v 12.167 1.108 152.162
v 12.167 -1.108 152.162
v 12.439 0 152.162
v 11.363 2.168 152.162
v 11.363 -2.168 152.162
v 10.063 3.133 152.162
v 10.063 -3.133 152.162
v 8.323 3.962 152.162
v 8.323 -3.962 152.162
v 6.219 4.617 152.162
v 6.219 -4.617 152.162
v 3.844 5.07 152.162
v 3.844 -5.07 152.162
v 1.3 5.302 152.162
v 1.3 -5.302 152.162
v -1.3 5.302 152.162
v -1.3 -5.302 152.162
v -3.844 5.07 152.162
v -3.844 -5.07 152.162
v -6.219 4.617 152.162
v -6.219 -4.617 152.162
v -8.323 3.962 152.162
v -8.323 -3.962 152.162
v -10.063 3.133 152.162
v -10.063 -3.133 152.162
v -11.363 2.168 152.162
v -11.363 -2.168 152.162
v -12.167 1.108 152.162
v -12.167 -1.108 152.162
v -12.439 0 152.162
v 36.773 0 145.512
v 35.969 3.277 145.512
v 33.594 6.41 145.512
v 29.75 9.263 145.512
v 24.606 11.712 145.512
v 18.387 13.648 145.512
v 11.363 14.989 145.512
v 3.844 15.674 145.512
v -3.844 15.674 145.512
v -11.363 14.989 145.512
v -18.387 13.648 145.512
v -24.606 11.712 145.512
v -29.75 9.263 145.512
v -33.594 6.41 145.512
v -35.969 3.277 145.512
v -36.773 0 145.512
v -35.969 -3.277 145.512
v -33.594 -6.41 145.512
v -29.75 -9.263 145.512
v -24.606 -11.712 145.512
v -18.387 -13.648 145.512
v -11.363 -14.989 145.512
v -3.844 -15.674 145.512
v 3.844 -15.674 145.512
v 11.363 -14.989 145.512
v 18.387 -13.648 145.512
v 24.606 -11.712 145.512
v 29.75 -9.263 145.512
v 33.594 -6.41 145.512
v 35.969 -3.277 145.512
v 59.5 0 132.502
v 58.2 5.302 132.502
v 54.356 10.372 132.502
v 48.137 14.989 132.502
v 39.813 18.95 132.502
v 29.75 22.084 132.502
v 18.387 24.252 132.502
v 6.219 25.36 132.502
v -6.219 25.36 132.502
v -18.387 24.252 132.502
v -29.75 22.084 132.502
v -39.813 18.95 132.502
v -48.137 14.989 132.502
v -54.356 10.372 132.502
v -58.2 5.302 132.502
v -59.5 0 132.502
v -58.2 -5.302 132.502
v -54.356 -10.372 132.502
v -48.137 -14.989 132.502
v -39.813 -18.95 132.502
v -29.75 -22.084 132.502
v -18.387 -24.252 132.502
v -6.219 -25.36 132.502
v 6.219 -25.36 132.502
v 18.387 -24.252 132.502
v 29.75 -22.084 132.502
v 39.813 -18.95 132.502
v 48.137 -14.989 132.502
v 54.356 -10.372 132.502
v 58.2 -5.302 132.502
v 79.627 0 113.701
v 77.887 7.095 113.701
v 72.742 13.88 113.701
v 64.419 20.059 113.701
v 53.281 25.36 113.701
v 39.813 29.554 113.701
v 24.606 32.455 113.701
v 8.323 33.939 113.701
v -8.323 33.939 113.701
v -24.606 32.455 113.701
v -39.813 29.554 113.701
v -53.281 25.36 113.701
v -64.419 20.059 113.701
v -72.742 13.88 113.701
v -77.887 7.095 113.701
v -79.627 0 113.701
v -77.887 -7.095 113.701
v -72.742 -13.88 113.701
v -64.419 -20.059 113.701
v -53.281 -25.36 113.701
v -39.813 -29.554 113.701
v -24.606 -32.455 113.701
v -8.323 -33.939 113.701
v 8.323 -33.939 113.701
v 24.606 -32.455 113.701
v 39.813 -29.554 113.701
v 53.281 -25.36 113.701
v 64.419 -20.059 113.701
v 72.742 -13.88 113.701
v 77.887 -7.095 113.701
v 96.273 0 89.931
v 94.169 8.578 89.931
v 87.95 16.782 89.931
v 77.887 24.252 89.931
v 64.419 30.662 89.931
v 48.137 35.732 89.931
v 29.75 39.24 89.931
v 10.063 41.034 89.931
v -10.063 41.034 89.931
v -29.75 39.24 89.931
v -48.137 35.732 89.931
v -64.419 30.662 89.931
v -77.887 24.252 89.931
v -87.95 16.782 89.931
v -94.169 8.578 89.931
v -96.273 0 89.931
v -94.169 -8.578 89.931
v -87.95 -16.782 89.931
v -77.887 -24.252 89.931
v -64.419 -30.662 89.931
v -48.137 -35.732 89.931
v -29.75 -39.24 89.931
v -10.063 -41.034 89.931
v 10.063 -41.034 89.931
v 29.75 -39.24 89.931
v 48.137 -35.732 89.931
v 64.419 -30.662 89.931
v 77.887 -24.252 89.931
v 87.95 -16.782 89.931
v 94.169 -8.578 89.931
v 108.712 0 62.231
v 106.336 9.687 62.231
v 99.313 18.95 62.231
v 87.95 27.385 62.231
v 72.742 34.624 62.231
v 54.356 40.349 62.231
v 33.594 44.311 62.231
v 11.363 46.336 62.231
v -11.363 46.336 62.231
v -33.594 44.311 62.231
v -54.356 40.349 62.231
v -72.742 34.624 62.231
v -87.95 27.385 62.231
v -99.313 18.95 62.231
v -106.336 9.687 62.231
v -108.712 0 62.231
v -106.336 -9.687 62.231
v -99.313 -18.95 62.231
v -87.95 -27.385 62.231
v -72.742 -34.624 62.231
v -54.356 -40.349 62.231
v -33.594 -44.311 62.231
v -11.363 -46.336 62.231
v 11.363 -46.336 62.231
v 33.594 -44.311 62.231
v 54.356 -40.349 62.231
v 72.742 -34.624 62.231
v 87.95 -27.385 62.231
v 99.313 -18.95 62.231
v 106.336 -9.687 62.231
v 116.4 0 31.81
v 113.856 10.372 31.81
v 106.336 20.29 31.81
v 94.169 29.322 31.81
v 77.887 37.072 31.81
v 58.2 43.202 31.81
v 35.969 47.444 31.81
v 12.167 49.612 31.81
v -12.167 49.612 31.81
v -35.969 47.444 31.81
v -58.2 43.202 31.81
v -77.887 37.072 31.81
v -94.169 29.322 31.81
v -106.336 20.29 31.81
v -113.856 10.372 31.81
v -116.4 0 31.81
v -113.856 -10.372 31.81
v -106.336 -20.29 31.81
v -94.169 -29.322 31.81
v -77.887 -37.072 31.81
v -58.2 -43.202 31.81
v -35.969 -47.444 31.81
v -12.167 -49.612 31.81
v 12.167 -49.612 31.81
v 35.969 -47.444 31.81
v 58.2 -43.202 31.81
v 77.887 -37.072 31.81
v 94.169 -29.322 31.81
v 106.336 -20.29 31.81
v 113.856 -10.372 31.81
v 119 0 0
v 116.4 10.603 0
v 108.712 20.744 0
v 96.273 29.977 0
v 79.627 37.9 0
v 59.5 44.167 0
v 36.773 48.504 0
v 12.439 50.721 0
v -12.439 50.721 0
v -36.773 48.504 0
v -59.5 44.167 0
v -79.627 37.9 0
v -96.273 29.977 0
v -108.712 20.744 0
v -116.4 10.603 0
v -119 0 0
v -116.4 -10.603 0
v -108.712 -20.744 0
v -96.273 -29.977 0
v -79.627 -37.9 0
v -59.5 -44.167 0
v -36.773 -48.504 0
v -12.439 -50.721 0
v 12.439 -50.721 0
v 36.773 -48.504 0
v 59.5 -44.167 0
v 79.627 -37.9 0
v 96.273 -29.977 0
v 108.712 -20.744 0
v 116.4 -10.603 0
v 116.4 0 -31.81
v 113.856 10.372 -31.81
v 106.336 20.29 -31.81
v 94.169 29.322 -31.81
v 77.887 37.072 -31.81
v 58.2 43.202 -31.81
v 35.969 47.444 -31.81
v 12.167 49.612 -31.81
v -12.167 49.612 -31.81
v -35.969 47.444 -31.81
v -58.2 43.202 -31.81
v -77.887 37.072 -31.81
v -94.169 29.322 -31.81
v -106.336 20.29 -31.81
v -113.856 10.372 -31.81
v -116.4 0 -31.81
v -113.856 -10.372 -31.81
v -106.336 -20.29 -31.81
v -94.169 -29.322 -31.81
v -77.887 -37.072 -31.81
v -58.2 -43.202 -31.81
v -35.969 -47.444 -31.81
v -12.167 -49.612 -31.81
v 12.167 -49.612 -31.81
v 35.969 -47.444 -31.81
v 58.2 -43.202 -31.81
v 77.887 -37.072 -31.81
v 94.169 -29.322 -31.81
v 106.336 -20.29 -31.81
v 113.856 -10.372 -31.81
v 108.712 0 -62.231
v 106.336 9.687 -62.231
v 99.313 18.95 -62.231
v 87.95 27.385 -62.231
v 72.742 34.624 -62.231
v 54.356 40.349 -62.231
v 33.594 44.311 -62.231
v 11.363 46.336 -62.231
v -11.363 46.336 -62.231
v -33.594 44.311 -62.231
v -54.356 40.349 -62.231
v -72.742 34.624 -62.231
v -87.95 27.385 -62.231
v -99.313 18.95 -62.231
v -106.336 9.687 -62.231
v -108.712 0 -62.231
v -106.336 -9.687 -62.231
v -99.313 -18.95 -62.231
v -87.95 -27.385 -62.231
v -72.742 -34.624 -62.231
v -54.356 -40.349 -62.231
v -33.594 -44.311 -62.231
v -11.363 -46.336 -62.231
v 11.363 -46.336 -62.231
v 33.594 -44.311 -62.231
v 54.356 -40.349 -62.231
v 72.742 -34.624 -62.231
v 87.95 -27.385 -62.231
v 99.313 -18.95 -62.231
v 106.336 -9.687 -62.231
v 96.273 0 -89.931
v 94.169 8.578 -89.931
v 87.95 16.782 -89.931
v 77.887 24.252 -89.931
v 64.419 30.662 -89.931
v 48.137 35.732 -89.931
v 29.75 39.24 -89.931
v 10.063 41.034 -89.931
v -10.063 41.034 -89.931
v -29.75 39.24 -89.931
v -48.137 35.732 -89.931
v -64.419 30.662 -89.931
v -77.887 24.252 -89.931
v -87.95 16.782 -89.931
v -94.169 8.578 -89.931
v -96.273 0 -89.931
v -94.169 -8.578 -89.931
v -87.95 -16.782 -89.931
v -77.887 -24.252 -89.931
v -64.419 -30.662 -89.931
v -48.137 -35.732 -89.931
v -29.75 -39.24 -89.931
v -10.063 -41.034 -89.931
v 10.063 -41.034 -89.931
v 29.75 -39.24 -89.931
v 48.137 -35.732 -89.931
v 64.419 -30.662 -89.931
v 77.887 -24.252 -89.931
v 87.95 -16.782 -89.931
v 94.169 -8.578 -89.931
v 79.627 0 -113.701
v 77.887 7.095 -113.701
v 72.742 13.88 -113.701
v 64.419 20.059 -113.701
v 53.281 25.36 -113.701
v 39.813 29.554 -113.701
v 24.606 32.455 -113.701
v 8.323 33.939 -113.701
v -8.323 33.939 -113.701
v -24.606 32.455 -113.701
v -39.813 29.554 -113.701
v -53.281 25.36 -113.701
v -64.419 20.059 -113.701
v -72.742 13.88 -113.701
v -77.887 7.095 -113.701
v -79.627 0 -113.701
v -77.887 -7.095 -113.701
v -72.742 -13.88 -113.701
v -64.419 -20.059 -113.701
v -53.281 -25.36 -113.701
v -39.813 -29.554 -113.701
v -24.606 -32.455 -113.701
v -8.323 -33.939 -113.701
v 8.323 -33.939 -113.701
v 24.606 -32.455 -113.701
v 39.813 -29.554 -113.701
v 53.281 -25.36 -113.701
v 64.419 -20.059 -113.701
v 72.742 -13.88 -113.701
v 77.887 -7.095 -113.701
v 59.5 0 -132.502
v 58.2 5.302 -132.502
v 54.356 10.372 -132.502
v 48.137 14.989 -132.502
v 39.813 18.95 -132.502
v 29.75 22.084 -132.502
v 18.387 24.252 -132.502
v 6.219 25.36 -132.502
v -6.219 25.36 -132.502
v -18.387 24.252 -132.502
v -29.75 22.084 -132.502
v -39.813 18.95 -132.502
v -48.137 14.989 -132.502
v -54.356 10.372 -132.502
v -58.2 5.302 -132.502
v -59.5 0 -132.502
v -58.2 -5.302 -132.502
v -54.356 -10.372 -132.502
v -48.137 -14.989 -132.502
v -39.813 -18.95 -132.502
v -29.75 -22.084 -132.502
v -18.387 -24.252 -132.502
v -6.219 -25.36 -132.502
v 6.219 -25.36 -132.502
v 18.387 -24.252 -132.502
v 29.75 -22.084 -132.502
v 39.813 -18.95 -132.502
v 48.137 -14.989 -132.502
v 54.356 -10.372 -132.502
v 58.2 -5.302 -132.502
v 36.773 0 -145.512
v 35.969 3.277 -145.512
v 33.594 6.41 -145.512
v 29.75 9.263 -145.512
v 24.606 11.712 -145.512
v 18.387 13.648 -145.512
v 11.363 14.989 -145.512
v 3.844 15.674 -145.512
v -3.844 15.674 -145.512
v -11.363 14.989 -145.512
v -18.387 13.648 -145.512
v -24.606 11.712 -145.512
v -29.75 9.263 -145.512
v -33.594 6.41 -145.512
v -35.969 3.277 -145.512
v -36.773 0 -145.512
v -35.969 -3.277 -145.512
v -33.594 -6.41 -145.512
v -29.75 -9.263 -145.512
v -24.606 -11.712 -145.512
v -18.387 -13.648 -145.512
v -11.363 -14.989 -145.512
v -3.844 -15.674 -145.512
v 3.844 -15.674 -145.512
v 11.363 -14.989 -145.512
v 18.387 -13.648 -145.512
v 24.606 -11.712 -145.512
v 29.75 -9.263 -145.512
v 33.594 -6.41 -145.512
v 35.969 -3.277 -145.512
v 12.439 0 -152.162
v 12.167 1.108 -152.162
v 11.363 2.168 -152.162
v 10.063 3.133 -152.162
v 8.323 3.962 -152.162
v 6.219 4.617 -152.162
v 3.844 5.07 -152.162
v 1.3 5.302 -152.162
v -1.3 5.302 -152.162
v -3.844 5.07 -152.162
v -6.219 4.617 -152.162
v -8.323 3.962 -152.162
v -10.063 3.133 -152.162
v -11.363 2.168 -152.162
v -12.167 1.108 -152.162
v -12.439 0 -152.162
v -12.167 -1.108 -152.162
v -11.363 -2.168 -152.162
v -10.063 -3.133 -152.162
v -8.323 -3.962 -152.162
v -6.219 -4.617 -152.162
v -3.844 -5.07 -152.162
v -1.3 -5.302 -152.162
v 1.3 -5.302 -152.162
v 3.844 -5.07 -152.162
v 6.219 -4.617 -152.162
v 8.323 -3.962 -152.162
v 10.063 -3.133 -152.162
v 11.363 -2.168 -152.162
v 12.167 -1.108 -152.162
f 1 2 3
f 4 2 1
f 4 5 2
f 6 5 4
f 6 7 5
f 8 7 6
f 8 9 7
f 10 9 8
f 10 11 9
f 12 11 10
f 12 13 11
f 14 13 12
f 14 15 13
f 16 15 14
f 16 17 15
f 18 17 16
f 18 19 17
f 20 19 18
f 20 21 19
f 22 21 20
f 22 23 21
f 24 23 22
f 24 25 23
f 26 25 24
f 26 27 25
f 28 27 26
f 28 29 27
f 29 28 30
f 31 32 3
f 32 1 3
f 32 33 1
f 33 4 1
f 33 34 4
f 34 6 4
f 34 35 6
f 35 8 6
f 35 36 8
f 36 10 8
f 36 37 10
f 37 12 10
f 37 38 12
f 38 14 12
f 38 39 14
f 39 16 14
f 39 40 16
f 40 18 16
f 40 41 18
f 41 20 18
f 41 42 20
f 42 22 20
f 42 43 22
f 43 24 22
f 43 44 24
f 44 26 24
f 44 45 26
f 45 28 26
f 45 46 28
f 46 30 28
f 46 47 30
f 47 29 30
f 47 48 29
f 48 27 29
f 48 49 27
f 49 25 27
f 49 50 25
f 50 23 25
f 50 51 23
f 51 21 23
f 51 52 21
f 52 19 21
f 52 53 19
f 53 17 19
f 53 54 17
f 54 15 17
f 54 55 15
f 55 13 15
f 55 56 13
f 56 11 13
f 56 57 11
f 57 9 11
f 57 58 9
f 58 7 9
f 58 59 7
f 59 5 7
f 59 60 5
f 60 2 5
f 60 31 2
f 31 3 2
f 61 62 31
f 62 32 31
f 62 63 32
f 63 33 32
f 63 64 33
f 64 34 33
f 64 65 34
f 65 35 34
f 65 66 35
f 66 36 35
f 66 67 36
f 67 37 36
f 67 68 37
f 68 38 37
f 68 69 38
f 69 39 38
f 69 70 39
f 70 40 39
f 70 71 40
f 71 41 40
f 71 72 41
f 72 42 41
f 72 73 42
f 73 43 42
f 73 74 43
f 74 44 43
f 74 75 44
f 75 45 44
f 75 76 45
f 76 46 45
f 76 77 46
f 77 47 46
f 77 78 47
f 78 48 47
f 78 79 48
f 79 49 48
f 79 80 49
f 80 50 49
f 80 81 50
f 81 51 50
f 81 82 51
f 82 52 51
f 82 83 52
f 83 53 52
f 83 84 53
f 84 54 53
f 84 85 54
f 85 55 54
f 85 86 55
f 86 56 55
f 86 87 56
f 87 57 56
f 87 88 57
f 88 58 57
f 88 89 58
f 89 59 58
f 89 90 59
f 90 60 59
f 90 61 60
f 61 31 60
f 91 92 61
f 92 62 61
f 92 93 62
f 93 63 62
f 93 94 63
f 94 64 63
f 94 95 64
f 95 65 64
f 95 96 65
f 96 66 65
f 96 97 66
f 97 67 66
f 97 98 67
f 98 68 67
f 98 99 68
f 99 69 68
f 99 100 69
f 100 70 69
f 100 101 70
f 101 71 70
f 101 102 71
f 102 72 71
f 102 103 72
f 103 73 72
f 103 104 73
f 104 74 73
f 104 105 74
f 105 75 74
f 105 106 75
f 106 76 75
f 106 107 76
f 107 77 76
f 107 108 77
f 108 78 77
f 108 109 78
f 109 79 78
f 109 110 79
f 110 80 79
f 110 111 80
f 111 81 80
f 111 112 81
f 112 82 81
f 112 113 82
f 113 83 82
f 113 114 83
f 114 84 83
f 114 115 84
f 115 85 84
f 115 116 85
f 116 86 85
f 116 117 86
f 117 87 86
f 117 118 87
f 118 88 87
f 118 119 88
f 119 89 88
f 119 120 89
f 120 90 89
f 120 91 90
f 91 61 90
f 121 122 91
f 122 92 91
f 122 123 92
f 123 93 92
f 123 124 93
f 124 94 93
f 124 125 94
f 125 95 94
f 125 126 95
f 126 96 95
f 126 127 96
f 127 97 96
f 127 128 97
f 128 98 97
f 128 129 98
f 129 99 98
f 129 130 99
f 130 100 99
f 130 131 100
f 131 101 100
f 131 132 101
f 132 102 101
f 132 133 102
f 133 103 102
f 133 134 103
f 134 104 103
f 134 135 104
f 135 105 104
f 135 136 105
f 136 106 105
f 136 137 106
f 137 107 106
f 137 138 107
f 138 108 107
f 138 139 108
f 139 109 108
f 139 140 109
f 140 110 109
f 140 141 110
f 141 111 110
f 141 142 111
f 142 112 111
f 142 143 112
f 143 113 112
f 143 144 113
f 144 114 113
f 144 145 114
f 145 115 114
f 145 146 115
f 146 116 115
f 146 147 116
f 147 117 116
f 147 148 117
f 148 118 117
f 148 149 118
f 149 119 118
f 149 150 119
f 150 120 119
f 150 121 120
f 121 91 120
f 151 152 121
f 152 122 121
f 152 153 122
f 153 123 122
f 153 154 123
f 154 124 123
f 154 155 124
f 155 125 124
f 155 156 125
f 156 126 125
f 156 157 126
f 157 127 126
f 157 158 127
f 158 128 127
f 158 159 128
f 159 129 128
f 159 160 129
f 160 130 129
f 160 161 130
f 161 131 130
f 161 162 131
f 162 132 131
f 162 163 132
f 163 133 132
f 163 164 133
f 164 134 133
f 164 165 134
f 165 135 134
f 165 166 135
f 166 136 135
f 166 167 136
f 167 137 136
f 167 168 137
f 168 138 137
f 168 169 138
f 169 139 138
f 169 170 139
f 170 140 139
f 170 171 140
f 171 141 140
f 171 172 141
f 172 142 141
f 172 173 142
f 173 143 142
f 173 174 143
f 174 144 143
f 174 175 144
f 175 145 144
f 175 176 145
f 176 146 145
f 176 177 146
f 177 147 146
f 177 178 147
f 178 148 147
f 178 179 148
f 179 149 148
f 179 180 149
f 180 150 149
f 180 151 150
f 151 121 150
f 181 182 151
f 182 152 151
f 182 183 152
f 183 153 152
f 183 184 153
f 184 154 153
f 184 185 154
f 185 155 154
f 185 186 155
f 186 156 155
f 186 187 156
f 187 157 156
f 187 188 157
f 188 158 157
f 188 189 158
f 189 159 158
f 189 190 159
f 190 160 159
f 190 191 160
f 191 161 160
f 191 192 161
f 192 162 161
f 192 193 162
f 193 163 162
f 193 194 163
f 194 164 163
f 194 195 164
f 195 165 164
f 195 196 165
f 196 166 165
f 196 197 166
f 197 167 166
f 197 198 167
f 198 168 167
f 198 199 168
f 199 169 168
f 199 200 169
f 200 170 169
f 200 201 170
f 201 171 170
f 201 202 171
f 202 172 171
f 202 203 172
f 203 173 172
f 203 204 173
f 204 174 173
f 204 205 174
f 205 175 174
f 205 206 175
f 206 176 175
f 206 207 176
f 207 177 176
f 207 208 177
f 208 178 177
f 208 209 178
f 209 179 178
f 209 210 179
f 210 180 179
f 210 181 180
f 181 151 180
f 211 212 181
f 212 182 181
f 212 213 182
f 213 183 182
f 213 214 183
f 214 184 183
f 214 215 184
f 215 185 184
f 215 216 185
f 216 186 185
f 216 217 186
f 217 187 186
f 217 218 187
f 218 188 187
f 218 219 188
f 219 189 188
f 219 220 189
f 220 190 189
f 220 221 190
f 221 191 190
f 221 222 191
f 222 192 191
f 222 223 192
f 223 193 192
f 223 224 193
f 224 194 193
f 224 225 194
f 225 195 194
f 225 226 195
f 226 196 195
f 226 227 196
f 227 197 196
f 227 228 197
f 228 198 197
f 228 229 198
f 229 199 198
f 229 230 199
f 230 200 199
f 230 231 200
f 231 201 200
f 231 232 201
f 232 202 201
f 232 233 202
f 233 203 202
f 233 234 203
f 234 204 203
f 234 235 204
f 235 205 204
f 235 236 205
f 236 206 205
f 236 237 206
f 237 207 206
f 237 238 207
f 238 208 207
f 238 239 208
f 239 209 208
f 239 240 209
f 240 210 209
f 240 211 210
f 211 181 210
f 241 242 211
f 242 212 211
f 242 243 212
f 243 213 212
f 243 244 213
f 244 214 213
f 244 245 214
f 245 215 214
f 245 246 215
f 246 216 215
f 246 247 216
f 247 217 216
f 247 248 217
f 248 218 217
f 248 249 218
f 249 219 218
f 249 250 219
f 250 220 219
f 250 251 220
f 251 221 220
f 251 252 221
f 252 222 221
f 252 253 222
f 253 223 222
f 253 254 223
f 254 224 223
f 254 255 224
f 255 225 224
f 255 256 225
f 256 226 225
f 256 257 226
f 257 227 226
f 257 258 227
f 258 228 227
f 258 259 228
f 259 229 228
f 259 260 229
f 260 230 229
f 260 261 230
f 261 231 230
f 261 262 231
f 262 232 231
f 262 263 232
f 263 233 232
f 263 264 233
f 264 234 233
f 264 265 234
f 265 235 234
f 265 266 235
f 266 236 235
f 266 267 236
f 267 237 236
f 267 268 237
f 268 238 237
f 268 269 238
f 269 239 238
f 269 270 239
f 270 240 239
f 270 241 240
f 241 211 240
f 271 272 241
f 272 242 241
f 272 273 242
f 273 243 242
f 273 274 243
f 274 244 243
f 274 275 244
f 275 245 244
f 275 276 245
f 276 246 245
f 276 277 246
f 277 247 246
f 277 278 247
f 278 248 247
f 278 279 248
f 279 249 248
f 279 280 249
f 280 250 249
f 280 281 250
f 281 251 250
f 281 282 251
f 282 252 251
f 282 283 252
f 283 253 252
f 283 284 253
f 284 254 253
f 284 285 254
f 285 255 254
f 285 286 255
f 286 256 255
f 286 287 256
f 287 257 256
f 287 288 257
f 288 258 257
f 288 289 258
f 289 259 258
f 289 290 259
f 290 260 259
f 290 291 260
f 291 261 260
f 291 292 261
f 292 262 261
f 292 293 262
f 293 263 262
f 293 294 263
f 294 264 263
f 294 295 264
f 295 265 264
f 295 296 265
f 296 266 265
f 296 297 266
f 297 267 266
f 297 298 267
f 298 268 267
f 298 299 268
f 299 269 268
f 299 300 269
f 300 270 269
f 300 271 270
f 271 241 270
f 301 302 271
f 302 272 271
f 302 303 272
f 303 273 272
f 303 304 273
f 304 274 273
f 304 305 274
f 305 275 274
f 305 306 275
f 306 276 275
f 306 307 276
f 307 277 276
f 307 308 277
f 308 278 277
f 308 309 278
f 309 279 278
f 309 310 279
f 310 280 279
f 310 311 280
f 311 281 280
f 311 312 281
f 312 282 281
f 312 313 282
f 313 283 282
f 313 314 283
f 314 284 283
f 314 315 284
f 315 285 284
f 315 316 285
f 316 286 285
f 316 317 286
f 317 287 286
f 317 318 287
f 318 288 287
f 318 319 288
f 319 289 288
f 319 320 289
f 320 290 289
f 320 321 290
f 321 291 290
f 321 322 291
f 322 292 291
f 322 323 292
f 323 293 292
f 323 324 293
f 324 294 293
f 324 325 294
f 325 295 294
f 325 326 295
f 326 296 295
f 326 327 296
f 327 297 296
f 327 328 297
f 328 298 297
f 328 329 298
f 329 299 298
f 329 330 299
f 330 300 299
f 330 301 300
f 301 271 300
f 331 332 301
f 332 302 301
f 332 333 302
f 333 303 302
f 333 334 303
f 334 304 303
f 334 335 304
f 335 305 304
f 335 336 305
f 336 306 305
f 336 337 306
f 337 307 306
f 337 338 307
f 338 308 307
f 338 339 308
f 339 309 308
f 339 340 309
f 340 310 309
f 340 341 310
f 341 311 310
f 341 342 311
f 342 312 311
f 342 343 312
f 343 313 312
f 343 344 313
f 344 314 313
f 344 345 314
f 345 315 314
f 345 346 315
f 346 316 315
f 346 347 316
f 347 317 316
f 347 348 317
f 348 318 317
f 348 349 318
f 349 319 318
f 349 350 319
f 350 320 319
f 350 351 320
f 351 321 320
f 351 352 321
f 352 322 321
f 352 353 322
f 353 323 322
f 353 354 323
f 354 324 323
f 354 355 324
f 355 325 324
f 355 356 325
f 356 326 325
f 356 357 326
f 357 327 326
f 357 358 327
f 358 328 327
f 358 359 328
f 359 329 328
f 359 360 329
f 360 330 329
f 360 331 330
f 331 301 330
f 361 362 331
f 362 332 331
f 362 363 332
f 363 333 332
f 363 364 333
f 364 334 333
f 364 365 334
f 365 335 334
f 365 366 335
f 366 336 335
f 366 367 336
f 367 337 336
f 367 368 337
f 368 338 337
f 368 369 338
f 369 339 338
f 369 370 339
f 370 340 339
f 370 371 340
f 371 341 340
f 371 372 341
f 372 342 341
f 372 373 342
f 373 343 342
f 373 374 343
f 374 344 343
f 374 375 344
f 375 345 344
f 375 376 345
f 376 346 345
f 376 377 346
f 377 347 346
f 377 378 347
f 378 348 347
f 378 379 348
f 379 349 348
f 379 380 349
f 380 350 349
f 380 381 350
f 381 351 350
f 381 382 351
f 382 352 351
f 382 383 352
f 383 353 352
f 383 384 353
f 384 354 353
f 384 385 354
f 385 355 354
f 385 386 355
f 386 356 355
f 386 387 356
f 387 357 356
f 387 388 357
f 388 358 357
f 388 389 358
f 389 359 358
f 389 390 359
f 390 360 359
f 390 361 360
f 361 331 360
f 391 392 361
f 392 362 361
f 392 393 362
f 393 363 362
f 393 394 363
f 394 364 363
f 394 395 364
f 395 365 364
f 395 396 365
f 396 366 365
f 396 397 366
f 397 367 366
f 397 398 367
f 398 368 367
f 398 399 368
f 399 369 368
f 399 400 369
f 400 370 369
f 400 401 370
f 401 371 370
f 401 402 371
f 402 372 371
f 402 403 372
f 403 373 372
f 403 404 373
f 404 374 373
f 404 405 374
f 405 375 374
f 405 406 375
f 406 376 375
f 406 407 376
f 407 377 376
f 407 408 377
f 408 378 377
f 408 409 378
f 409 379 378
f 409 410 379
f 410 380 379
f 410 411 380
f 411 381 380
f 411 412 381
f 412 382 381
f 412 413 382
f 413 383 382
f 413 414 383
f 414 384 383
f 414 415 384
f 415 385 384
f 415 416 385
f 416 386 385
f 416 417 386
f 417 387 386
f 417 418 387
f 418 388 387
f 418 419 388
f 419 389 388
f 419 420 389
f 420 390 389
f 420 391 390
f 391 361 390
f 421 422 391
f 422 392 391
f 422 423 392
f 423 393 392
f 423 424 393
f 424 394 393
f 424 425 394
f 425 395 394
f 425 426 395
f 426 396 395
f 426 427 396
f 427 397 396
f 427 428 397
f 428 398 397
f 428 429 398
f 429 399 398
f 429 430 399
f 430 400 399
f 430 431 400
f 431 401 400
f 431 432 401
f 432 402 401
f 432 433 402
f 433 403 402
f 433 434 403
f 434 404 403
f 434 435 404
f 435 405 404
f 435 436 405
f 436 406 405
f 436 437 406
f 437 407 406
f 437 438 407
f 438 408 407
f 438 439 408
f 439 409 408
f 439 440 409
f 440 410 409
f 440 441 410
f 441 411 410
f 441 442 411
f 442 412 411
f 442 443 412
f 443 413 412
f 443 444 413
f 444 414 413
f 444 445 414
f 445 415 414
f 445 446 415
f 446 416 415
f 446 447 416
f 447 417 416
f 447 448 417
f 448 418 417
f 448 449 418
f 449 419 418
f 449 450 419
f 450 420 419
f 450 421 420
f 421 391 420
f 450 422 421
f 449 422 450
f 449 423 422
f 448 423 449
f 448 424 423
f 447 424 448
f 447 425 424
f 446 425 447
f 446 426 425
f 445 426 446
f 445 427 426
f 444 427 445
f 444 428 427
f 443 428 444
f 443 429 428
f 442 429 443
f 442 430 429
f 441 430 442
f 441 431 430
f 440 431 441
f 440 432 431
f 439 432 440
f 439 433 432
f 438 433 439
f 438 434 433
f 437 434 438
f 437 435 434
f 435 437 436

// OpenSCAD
// Generated by SolidPython 1.0.1 on 2020-07-29 00:46:47


scale(v = [7, 3, 9]) {
	sphere(r = 17);
}
/***********************************************
*********      SolidPython code:      **********
************************************************
 
# import packages: SolidPython
from solid import *
from solid.utils import *
from itertools import chain, combinations, permutations


class Resize:

    def __init__(self, scad_file):
        self.scad_file = scad_file
        #self.scad_file = import_scad(scad_file)
        # cone/cylinder param:
        self.r1 = 0
        self.r2 = 0
        self.h = 0
        # rectangular prism param:
        self.w = 0
        self.l = 0
        # ellipse param:
        self.r = 0

    # import OpenScad code (file name corresponds to shape)


    # classify shape + parameters
    def assign(self, param1, param2, param3):
        if self.scad_file == 'cone.scad':
            self.r1 = param1
            self.r2 = param2
            self.h = param3
        elif self.scad_file == 'cylinder.scad':
            self.r1 = param1
            self.r2 = param2
            self.h = param3
        elif self.scad_file == 'rectangularPrism.scad':
            self.h = param1
            self.l = param2
            self.w = param3
        else:
            self.r = param1
            self.h = param2

    # resize parameters
    def iterate(self):
        x = range(3, 20, 2)
        i = 1
        if self.scad_file == 'cone.scad':
            tempList = list(permutations(x, 2))
            for temp in tempList:
                param1 = temp[0]
                param2 = temp[1]
                filepath = 'produced_scad_files/' + 'cone' + str(param1) + '_' + str(param2) + '_' + '.scad'
                scad_render_to_file(cylinder(h=param1, r1=param2, r2=0), filepath)

        elif self.scad_file == 'cylinder.scad':
            tempList = list(permutations(x, 3))
            for temp in tempList:
                param1 = temp[0]
                param2 = temp[1]
                filepath = 'produced_scad_files/' + 'cylinder' + str(param1) + '_' + str(param2) + '_' + '.scad'
                scad_render_to_file(cylinder(h=param1, r1=param2, r2=param2), filepath)

        elif self.scad_file == 'rectangularPrism.scad':
            tempList = list(permutations(x, 3))
            for temp in tempList:
                param1 = temp[0]
                param2 = temp[1]
                param3 = temp[2]
                filepath = 'produced_scad_files/' + 'rectangularPrism' + str(param1) + '_' + str(param2) + '_' + str(
                    param3) + '.scad'
                scad_render_to_file(cube(size=(param1, param2, param3)), filepath)

        elif self.scad_file == 'ellipse.scad':
            tempList = list(permutations(x, 4))
            for temp in tempList:
                param1 = temp[0]
                param2 = temp[1]
                param3 = temp[2]
                param4 = temp[3]
                filepath = 'produced_scad_files/' + 'ellipse' + str(param1) + '_' + str(param2) + '_' + str(param3) + '_' + str(param4) + '.scad'
                scad_render_to_file(scale([param1, param2, param3])(sphere(r=param4)), filepath)

    def render_to_scadfile(self):
        scad_render_to_file(scad, 'example.scad') 
 
************************************************/
